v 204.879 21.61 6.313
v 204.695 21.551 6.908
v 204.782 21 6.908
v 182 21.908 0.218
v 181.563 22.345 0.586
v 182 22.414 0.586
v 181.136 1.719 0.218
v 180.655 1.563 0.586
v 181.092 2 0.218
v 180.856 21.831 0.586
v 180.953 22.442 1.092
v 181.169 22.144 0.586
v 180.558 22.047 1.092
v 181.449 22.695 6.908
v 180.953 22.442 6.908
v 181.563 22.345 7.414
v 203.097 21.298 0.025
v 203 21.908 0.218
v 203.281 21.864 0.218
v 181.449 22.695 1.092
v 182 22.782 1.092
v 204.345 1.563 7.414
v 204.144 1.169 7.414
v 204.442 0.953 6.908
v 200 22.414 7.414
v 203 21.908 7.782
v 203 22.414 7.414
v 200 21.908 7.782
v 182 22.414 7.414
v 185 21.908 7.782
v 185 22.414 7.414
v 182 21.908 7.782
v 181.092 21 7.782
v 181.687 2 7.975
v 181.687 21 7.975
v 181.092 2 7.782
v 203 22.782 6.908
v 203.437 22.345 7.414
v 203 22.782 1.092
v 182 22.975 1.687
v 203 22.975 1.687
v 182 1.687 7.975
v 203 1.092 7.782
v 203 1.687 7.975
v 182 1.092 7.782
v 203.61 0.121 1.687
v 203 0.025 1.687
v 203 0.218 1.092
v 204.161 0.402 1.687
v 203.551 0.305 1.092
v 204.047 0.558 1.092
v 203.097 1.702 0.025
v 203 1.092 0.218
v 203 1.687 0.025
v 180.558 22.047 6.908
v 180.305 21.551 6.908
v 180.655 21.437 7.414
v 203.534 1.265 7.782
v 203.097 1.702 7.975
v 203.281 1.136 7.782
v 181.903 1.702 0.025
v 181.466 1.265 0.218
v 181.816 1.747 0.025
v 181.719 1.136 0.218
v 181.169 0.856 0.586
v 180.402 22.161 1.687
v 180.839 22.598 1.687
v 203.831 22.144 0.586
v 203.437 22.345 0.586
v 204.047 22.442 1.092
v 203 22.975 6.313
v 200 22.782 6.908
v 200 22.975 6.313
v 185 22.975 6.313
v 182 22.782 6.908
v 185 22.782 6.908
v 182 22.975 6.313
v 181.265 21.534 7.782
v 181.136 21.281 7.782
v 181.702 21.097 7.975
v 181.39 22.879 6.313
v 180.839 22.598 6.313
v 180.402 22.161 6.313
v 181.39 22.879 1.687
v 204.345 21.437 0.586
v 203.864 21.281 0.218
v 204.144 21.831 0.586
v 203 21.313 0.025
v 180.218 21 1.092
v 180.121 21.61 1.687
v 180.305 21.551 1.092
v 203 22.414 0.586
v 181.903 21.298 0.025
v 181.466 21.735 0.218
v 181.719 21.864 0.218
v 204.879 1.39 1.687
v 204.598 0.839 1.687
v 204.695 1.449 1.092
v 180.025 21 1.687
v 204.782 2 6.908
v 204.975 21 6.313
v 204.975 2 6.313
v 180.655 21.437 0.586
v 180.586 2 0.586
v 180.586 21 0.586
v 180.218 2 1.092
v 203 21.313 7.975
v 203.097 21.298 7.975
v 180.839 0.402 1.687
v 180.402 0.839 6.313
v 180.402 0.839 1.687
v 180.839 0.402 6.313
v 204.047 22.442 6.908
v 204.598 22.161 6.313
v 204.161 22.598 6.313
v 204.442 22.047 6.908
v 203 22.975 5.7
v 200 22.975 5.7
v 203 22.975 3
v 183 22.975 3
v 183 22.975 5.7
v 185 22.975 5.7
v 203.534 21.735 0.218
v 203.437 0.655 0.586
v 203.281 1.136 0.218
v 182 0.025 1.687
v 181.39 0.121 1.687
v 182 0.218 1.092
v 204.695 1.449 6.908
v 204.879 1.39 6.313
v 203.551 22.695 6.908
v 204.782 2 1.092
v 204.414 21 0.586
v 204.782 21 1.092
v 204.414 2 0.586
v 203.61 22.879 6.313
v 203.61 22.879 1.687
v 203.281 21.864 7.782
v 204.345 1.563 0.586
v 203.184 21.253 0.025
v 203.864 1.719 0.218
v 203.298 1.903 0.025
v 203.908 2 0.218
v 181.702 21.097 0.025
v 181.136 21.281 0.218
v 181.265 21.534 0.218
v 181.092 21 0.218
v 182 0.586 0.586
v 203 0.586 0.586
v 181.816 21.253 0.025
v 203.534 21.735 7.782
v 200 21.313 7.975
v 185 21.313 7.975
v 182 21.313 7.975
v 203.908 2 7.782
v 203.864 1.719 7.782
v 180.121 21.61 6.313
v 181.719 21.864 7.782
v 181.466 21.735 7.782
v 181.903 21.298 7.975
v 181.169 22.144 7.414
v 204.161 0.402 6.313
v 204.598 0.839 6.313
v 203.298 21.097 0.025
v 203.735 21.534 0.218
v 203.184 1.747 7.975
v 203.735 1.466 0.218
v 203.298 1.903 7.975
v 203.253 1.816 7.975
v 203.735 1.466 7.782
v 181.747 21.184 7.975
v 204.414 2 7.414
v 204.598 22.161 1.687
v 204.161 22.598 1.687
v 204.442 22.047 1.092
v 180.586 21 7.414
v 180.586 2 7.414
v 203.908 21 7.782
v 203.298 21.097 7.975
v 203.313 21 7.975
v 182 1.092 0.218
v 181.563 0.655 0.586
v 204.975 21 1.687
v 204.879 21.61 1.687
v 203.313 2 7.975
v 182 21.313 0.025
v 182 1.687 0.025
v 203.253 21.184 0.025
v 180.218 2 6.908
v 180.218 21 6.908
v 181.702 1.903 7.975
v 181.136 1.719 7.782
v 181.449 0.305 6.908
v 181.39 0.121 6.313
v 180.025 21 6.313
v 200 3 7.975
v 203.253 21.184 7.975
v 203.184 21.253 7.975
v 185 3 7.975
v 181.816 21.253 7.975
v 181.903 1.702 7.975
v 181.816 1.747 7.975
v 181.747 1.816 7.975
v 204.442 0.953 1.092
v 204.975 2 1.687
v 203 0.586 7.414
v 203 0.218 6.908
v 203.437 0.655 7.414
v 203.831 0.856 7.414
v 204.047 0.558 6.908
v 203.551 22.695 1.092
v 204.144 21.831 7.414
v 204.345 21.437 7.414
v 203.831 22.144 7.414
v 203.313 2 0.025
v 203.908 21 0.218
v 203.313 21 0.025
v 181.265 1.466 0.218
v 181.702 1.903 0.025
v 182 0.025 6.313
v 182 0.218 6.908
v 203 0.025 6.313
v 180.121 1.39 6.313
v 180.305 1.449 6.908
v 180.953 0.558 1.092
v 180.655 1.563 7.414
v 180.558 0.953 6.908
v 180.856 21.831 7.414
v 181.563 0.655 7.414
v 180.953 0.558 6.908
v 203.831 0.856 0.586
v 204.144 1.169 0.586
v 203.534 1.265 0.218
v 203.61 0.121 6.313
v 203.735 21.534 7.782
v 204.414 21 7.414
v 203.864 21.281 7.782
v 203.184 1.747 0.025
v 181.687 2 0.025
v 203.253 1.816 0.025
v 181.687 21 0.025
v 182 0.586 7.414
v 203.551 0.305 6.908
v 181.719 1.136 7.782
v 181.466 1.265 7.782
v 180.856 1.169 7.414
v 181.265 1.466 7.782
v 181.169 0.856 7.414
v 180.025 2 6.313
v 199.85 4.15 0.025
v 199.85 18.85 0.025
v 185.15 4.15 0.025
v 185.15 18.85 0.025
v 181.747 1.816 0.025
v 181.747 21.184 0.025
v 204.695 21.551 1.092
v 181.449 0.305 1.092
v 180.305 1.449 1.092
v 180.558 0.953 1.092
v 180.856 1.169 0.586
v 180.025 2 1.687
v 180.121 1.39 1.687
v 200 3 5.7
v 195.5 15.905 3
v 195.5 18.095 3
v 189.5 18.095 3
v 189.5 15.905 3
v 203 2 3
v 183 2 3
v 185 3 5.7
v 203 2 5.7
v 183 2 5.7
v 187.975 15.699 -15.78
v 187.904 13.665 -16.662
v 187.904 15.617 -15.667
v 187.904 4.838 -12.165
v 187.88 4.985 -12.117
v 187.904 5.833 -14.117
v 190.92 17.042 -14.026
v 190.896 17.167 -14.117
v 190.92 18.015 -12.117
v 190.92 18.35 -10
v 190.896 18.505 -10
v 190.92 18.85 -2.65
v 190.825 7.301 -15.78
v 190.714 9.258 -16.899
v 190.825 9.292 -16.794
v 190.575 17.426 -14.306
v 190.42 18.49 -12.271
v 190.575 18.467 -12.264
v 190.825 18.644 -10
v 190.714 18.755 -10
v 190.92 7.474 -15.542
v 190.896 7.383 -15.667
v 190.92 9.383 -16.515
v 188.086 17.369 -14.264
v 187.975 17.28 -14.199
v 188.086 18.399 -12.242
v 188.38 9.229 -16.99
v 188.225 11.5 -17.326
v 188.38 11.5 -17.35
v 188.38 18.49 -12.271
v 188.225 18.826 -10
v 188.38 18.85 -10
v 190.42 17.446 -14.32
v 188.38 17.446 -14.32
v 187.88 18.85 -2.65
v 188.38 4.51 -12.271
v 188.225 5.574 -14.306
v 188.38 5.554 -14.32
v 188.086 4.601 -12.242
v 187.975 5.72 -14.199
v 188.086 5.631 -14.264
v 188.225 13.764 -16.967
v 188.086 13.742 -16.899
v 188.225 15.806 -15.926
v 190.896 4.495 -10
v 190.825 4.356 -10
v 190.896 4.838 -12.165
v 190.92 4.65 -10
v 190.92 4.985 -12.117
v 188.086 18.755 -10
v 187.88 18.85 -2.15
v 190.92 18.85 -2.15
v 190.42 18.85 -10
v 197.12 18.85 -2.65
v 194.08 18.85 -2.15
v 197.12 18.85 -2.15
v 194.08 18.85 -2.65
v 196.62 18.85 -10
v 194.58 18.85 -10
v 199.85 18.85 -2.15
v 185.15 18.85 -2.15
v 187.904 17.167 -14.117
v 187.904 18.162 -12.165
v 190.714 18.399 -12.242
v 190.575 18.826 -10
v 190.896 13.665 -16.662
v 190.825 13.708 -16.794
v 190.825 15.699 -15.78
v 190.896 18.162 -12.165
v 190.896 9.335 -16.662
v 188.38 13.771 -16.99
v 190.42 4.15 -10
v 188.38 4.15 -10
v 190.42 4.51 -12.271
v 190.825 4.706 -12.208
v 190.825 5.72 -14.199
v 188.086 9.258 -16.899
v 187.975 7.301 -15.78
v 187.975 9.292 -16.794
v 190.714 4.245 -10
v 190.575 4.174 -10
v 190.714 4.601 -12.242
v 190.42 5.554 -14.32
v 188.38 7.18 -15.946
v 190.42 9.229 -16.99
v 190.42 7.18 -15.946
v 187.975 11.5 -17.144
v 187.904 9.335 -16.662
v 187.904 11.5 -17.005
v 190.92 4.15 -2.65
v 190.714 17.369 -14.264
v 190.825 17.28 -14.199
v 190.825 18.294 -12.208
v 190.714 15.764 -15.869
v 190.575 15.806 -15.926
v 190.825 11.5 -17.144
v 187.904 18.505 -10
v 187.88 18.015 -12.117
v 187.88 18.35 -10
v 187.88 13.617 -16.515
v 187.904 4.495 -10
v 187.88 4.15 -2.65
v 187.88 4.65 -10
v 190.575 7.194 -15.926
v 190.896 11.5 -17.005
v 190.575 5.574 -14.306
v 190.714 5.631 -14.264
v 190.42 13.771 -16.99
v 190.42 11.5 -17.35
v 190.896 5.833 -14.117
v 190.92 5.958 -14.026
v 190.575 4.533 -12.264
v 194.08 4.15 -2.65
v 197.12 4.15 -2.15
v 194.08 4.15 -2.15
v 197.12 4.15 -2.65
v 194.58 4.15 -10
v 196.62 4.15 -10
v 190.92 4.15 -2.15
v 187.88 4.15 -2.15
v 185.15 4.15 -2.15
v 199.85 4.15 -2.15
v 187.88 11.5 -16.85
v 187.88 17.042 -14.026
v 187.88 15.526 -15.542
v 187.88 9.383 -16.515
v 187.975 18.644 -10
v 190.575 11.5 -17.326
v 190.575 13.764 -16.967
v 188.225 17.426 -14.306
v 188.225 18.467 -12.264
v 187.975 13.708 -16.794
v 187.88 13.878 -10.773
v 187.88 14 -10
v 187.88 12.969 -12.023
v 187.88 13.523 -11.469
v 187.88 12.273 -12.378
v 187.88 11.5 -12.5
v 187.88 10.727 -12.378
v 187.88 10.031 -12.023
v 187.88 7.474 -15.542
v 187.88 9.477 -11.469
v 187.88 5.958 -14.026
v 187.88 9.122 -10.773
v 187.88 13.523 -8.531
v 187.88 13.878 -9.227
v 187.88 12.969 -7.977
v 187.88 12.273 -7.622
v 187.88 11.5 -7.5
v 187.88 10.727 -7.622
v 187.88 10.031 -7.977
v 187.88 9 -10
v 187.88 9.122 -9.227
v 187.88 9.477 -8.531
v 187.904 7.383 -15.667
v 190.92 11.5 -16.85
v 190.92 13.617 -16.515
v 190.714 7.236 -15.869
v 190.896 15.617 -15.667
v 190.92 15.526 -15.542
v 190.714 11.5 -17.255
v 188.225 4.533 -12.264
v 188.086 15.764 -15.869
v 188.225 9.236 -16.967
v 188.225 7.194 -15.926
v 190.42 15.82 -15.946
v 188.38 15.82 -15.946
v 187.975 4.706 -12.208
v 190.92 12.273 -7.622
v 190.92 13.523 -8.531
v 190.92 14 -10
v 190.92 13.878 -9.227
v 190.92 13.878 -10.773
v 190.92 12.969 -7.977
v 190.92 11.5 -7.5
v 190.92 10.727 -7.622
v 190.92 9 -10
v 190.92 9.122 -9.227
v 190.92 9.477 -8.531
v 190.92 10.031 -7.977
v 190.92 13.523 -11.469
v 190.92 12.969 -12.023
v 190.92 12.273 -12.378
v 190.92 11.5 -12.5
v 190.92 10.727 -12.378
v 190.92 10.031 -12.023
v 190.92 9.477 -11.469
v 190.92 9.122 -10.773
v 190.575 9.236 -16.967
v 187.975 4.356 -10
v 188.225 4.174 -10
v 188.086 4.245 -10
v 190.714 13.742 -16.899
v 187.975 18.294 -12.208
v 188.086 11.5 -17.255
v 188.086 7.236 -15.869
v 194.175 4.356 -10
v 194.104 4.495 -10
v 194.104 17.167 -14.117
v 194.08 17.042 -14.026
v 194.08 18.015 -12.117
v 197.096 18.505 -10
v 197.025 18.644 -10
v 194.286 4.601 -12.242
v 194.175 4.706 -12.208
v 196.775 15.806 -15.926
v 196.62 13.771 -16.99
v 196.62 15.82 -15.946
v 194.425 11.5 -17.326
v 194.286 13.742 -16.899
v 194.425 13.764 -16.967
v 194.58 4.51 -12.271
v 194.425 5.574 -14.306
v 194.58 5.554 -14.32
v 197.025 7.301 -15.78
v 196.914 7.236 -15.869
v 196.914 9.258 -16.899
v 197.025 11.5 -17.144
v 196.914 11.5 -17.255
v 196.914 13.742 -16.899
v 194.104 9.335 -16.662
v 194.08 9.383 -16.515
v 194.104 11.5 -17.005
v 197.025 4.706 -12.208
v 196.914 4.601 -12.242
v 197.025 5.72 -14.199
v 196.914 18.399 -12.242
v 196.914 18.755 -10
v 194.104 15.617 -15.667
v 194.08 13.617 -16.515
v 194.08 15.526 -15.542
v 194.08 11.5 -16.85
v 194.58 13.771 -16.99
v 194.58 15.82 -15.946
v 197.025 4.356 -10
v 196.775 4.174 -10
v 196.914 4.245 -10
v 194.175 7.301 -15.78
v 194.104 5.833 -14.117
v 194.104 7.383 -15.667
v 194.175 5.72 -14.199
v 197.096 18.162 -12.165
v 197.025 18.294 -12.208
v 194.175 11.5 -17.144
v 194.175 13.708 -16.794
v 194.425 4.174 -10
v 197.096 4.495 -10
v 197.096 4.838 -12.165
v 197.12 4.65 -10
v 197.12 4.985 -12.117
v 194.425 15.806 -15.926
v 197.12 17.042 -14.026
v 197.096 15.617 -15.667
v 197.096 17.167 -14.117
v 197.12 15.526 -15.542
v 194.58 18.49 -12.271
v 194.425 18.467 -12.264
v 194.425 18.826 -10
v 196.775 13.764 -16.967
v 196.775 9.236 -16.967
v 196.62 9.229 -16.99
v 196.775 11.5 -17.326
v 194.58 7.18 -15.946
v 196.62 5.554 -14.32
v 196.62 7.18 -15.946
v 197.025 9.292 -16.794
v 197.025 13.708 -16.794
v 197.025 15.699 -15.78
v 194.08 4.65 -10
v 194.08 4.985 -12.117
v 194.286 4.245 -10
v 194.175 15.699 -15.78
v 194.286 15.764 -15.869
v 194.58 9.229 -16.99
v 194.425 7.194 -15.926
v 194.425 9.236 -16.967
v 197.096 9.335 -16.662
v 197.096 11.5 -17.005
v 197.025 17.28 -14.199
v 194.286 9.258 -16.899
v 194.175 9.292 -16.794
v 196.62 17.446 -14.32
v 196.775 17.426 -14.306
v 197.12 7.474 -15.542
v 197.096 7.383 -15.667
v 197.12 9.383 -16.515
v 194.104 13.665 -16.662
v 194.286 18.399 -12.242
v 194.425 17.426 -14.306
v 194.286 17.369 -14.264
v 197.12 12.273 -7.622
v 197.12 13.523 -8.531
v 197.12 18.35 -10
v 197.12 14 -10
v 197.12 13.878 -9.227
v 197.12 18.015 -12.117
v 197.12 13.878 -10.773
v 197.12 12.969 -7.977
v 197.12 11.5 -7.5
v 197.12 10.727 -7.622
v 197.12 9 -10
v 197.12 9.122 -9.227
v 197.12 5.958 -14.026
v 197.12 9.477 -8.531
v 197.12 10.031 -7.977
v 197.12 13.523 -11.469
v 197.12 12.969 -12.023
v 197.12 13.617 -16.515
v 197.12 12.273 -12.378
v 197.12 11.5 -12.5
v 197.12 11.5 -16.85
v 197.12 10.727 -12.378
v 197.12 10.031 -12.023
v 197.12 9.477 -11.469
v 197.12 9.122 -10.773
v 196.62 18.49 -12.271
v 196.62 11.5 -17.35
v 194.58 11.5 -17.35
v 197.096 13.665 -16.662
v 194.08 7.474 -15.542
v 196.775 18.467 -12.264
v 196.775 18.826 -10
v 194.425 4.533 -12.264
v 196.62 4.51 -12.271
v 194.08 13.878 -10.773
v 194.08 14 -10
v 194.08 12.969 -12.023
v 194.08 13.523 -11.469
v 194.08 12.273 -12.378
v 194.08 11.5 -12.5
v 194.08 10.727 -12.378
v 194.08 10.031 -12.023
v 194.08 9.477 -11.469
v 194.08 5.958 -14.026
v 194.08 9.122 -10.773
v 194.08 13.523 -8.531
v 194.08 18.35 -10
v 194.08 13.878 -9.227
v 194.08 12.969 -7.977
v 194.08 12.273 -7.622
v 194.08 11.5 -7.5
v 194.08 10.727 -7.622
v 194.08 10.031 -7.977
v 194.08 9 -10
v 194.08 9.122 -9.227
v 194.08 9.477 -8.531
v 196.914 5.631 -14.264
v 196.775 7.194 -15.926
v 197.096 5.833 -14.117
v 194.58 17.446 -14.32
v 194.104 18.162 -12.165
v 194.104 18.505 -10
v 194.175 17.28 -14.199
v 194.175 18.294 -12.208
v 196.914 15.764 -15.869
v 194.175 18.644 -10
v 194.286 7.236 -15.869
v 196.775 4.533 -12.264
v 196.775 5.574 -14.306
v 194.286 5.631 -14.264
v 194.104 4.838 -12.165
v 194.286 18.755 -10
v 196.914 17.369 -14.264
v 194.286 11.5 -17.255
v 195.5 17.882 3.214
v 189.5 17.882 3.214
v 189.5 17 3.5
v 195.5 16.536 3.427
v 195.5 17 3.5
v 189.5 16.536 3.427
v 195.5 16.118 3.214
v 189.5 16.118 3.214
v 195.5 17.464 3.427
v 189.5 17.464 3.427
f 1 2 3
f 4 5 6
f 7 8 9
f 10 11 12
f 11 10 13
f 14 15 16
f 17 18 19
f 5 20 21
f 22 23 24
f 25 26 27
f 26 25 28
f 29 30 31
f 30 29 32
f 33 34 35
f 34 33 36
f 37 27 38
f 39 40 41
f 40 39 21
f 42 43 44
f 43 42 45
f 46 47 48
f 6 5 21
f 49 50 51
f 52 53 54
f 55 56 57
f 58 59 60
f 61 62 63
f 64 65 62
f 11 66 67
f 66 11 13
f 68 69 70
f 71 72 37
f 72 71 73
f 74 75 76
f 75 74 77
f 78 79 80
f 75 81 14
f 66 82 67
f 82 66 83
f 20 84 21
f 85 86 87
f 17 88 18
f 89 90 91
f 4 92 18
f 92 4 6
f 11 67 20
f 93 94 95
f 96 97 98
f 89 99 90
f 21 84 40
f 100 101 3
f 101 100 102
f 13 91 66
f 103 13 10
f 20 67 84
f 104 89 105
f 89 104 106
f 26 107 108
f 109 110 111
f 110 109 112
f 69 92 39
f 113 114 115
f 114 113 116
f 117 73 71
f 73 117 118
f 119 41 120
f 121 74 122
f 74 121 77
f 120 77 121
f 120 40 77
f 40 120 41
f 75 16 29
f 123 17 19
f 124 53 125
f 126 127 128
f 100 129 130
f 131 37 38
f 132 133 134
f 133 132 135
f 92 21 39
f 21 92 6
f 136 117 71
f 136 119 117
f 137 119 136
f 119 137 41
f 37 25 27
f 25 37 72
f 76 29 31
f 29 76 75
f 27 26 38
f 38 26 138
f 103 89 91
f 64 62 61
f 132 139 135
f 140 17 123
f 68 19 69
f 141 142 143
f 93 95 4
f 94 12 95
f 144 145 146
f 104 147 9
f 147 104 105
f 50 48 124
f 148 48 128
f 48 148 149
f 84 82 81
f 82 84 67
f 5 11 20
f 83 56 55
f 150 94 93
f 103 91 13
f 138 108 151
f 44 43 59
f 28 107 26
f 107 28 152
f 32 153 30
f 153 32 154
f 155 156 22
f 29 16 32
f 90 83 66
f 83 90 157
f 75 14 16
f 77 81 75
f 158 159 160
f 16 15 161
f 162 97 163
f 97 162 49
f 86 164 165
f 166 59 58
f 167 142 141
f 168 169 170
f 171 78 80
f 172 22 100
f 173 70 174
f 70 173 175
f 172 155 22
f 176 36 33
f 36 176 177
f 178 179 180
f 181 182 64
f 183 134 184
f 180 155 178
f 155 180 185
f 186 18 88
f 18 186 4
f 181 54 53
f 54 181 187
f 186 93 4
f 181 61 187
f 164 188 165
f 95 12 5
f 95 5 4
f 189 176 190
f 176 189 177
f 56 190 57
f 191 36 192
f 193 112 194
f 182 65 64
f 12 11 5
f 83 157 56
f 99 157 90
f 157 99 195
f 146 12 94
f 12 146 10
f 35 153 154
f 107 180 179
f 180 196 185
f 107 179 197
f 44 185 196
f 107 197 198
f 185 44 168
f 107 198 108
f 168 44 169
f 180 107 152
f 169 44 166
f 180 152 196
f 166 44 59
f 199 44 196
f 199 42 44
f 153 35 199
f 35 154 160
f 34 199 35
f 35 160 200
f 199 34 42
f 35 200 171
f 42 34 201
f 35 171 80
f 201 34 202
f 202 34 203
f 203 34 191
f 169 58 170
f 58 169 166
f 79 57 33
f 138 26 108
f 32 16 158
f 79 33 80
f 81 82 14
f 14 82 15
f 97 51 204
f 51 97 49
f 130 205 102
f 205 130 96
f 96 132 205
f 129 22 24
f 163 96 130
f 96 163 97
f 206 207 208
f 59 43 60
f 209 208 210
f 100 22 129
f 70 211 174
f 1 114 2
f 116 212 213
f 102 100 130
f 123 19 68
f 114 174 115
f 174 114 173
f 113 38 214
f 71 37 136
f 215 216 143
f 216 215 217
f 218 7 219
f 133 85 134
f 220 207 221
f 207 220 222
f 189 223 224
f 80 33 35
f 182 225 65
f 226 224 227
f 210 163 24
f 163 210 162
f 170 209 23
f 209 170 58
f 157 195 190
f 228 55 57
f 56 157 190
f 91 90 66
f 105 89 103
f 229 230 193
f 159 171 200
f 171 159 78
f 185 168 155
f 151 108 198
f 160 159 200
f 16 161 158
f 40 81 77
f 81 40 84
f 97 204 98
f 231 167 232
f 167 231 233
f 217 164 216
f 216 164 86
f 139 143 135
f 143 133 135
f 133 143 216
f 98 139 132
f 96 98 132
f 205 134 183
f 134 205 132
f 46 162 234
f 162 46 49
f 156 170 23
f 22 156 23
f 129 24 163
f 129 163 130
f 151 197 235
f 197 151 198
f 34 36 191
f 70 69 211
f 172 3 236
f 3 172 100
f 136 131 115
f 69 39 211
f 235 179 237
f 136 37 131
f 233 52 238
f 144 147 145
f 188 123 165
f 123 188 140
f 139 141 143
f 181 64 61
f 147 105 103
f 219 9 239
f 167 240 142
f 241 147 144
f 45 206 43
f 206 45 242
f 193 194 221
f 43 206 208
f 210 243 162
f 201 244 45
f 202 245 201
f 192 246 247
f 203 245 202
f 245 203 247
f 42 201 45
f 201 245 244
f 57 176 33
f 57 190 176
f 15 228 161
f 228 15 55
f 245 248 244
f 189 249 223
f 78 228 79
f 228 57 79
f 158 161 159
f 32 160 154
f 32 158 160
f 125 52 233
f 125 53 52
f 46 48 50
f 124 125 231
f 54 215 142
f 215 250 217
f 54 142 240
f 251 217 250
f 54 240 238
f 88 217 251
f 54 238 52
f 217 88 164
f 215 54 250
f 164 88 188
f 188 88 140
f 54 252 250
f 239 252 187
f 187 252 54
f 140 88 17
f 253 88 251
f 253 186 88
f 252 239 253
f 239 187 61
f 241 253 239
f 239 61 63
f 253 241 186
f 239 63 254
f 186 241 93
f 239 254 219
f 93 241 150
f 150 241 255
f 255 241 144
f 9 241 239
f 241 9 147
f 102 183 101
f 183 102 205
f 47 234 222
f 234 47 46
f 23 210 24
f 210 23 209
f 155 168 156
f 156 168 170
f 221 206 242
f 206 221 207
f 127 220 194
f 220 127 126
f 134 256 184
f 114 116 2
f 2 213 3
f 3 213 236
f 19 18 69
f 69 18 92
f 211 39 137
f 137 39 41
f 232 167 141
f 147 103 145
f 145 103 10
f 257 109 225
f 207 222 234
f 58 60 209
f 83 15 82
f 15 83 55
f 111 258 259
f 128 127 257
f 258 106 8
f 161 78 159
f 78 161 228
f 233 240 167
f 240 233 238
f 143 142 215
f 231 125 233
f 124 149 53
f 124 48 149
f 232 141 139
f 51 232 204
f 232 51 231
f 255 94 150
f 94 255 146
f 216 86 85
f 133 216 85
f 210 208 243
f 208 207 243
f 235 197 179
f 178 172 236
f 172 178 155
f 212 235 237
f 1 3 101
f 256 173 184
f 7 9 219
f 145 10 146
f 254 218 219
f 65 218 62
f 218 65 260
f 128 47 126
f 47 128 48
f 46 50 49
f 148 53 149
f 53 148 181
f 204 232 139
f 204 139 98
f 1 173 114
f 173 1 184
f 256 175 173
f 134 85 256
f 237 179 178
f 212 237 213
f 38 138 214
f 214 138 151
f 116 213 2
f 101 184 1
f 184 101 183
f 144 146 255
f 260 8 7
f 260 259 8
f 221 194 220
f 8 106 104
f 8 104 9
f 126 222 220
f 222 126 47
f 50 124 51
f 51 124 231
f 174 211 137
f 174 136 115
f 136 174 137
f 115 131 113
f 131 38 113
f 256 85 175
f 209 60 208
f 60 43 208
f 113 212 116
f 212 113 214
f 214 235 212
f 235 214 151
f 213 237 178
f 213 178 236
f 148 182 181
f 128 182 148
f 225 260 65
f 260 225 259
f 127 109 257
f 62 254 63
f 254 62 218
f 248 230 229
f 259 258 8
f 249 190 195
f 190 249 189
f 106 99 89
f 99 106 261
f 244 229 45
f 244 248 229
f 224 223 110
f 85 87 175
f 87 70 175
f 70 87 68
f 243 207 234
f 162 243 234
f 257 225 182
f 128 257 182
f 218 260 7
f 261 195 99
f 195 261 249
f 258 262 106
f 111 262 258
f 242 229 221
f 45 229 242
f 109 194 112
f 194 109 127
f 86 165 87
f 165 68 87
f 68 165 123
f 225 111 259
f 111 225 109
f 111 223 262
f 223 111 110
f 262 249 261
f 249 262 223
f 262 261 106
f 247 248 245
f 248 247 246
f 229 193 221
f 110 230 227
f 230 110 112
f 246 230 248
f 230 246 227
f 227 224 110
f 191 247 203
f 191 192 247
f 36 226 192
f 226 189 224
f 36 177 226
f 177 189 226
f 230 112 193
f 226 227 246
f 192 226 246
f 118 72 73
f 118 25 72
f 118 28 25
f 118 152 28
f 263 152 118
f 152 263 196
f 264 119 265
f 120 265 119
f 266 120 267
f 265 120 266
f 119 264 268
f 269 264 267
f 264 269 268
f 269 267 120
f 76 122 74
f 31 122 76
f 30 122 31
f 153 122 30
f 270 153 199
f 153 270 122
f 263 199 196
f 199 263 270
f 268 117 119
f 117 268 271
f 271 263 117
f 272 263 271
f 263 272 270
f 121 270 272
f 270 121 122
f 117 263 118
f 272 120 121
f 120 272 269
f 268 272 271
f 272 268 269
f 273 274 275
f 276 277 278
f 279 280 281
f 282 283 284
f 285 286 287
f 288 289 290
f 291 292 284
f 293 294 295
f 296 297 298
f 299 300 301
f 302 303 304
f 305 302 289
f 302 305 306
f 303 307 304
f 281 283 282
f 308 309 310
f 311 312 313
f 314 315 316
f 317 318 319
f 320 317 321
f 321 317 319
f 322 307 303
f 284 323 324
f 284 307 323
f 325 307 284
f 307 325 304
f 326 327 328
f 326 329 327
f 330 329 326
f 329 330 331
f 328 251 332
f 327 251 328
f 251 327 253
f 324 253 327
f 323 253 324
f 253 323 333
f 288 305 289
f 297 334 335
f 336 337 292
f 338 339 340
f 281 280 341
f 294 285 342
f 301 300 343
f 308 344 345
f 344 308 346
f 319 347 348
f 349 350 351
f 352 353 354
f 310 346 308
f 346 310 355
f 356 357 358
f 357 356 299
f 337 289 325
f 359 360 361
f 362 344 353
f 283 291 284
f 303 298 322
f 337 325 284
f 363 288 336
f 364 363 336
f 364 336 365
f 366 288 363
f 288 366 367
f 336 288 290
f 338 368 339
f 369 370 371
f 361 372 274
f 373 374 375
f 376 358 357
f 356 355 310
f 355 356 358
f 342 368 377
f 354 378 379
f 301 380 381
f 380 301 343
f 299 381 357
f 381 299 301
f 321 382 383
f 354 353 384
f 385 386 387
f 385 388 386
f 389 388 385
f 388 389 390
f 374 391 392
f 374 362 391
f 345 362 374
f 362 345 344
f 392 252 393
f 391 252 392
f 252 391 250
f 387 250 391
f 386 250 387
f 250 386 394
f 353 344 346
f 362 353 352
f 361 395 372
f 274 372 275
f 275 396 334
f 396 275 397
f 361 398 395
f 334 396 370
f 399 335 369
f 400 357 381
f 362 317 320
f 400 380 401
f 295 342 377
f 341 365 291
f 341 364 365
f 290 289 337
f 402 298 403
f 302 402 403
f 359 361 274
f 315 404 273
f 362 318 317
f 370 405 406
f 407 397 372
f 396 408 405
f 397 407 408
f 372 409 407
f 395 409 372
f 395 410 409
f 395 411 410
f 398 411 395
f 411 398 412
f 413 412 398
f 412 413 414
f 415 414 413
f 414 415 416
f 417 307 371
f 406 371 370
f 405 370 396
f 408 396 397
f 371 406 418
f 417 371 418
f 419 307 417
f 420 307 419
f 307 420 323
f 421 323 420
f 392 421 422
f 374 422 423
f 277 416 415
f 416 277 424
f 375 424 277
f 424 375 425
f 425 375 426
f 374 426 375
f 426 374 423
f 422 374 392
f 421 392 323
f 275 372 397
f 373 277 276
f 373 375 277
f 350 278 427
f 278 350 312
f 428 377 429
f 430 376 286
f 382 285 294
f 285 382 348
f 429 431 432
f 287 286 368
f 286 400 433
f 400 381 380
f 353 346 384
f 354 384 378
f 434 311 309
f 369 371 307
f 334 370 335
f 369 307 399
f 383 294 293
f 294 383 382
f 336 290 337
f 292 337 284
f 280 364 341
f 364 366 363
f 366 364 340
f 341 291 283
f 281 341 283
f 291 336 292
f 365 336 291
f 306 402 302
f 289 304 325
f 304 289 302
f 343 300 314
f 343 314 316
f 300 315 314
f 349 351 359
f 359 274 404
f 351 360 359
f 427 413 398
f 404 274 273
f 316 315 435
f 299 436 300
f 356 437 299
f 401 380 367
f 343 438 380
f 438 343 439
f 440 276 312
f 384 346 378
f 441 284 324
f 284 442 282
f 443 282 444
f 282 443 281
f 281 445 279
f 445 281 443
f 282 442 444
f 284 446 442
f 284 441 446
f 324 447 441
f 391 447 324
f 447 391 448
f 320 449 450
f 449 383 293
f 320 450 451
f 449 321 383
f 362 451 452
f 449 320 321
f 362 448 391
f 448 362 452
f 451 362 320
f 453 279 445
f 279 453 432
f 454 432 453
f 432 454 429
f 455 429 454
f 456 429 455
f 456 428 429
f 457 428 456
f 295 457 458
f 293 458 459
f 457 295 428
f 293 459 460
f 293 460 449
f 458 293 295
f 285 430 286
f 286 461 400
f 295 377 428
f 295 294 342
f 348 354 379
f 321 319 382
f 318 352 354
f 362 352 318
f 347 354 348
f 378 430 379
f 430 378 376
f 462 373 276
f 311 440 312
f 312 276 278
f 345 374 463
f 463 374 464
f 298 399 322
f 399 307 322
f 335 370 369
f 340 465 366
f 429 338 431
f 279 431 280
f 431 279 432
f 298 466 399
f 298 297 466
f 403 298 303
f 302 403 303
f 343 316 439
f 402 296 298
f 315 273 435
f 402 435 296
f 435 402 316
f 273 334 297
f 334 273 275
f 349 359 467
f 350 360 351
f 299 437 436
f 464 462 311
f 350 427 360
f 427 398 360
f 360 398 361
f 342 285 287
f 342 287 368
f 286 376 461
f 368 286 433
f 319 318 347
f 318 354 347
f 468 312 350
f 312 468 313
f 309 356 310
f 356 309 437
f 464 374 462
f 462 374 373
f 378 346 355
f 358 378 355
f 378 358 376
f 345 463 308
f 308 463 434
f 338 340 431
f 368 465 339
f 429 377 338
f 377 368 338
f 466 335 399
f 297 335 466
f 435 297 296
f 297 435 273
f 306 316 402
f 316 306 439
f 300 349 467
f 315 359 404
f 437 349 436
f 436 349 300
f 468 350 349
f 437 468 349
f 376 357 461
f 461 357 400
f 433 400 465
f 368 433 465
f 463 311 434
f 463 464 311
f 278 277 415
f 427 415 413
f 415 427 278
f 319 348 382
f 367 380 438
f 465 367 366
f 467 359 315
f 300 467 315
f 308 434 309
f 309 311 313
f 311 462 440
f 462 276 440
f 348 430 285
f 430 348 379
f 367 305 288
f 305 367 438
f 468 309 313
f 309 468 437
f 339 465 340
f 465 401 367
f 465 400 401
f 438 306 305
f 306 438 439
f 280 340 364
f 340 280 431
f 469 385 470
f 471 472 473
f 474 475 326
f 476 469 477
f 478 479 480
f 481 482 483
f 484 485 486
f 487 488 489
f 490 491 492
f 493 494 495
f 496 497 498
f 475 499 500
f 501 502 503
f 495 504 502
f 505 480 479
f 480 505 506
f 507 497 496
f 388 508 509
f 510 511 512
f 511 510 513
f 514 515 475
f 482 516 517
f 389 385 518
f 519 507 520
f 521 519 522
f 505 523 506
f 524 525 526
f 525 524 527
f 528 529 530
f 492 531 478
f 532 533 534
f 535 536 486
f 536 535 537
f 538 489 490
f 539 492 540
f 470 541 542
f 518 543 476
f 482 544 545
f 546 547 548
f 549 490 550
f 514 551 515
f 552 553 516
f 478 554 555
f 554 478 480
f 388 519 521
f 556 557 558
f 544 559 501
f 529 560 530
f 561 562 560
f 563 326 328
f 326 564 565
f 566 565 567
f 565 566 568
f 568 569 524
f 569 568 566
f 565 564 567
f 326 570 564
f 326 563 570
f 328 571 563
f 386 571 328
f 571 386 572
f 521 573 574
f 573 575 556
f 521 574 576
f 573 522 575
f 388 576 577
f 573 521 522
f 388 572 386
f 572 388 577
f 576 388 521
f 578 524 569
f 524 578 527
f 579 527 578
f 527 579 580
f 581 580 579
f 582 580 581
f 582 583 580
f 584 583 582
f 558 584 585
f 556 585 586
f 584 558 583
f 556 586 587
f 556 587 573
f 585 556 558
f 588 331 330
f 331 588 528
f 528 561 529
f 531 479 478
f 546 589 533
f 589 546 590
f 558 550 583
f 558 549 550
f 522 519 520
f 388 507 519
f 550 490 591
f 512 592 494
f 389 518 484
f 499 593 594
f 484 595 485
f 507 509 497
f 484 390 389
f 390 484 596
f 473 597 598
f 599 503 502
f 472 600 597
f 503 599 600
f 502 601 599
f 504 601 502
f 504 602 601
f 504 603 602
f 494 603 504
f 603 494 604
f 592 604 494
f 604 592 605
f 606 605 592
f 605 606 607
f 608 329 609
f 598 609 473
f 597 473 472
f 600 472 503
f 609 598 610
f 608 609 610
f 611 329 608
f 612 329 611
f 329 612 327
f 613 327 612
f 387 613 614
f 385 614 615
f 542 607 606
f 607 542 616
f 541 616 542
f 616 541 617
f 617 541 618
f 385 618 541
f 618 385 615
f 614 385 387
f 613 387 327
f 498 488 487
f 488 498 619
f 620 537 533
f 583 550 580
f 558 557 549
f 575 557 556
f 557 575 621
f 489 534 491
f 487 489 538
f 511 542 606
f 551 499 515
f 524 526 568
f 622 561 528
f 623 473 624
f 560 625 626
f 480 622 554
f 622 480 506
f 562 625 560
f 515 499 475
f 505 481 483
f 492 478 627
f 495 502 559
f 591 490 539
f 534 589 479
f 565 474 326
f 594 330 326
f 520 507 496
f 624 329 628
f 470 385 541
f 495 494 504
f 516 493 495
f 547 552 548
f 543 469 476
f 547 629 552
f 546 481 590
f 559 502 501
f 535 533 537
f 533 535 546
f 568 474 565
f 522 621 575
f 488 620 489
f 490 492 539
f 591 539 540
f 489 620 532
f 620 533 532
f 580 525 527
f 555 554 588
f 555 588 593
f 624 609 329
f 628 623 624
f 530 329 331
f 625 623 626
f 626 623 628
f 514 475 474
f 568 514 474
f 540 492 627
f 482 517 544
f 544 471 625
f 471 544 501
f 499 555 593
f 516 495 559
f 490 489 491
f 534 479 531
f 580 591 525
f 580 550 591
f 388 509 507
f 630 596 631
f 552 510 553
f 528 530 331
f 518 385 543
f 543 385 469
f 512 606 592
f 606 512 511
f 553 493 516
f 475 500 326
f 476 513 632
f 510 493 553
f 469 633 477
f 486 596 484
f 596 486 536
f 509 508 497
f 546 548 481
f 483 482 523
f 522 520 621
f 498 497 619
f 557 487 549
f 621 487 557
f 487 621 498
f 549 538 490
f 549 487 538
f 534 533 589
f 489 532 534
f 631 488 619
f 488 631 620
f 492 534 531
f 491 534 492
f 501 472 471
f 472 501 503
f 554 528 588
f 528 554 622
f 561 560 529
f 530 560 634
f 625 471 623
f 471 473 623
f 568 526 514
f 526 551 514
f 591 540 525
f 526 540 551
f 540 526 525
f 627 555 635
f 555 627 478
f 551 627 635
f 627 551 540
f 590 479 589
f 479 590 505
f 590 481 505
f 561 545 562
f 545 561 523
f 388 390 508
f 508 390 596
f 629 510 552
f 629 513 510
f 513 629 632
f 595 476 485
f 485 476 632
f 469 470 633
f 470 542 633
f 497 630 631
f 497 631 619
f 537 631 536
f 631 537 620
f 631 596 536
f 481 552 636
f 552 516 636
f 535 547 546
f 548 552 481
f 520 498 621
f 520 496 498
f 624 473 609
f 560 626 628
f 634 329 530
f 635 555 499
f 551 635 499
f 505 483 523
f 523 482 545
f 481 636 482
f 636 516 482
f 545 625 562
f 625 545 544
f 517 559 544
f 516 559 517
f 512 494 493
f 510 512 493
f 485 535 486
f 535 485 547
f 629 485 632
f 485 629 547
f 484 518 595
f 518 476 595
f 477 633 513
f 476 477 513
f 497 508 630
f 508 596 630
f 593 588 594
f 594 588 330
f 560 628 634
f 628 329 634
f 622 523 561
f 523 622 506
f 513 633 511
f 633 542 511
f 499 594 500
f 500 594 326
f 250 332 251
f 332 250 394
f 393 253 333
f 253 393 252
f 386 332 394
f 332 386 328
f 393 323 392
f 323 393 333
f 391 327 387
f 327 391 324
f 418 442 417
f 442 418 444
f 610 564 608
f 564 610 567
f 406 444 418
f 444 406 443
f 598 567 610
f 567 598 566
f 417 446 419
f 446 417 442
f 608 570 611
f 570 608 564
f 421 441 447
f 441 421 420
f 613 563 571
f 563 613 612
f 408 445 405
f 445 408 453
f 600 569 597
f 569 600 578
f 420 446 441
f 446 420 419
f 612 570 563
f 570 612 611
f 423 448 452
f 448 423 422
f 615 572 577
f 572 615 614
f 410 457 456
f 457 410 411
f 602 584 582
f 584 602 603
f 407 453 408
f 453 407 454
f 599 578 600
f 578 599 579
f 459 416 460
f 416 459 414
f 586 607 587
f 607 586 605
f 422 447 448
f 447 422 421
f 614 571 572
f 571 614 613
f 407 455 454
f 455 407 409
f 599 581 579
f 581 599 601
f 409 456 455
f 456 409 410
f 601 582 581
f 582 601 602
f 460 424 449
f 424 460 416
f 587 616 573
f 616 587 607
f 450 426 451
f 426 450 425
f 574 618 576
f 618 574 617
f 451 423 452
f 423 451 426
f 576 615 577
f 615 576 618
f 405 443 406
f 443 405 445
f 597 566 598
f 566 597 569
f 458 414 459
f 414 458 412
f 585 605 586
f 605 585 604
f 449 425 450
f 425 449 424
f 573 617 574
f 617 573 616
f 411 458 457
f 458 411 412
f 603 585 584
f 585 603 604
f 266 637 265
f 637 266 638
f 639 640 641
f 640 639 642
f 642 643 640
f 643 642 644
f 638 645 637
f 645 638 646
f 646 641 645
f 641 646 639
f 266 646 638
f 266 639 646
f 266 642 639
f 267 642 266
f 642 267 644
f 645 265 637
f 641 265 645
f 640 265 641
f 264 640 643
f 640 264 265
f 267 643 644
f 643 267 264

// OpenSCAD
$fn = 20;
use <libraries/gopro_mounts_mooncactus.scad>

outside_length = 40;
outside_width = 26;
outside_height = 6;
inside_length = outside_length + 2;
inside_width = 18.1;
inside_height = 2;
space_width = 14;

clamp_offset = 60;
//clamp_dia = 31.8;
clamp_dia = 35;


// Enables the light mount
lightmount_enabled = 0;
// Use the gopro mount or the tab mount - 1 = gopro
gopro_tab_enabled = 1;
// Handlebar clamp mount
clamp_enabled = 0;
// Helmet platform mount
helmet_platform_enable = 0;
// Serfas Light mount
serfas_light_mount = 1;

module rounded_box(x,y,z,r){
    translate([r,r,r])
    minkowski(){
        cube([x-r*2,y-r*2,z-r*2]);
        sphere(r=r, $fs=0.1);
    }
}

if (lightmount_enabled)
{
    difference()
    {
        cube([outside_width,outside_length,outside_height]);
        translate([(outside_width-inside_width)/2,-1,outside_height-3.5]) cube([inside_width,inside_length,inside_height]);
        translate([6,-1,outside_height-2]) cube([space_width,inside_length,inside_height+2]);
        translate([5.75,-2,outside_height-2.5]) {
            rotate([0, 0, 65]) {
                cube([5,2,3]);
            }
        }
        translate([outside_width-4.5,0,outside_height-2.5]) {
            rotate([0, 0, 115]) {
                cube([5,2,3]);
            }
        }
    }
    translate([inside_width/2+1.5,outside_length-2,2]) rotate([0,90,0]) cylinder(h=5,r=1);

    if (gopro_tab_enabled)
    {
        // Create a "triple" gopro connector
        translate([outside_width/2,outside_length/2,-10]) rotate([90,0,90]) gopro_connector("double");
    }
    else
    {
        difference()
        {
            union()
            {
                translate([outside_width/2-8,outside_length/2-7.5,-7]) cube([6,15,7]);
                translate([outside_width/2-8,outside_length/2,-7]) rotate([0,90,0]) cylinder(h=6,d=15);
            }
            translate([outside_width/2-8,outside_length/2,-7]) rotate([0,90,0]) cylinder(h=7,d=5);
            translate([outside_width/2-12,outside_length/2,-7]) rotate([0,90,0]) cylinder(h=7,d=9);
        }
        translate([inside_width/2+1.25,outside_length/2,-4]) rotate([0,0,0]) cylinder(h=3,r=1);
        translate([inside_width/2+1.25,outside_length/2,-13]) rotate([0,0,0]) cylinder(h=3,r=1);
        translate([inside_width/2+1.25,outside_length/2-3,-7]) rotate([90,0,0]) cylinder(h=3,r=1);
        translate([inside_width/2+1.25,outside_length/2+6,-7]) rotate([90,0,0]) cylinder(h=3,r=1);
    }

}

if (clamp_enabled)
{
    translate([clamp_offset,0,0])
    gopro_bar_clamp(
        rod_d= clamp_dia, // rod diameter
        th= 5.0, // main thickness
        gap= 2.4, // space between the clamps
        screw_d= 4.25, // screw diameter
        screw_head_d= 8.2, // screw head diameter
        screw_nut_d= 8.01, // nut diameter from corner to corner
        screw_shoulder_th=5.5, // thickness of the shoulder on which the nut clamps
        screw_reversed=0	 // true to mirror the orientation of the clamp bolts
    );

    translate([clamp_offset,0,0]) gopro_connector("triple");
}

if (helmet_platform_enable)
{
    translate([100,0,0])
    {
        difference()
        {
            rounded_box(50, 50, 5, 1);
            translate ([5, 5, -1]) cube([5, 40, 7]);
            translate ([40, 5, -1]) cube([5, 40, 7]);
        }
        translate([17,17,0]) cube([16, 16, 15]);
        translate([25,25,25]) rotate([270, 0, 90]) gopro_connector("triple");
    }
}

if (serfas_light_mount)
{
    translate([180, 0, 0])
    {
        difference()
        {
            rounded_box(25, 23, 8, 2);
            translate ([5, 3, 3]) cube([15, 23, 5]);
            translate ([3, 2, 3]) cube([20, 23, 2.7]);
        }
        translate([9.5, 17, 2.0]) rotate([0,90,0]) cylinder(h=6,d=3);
        translate([12.5, 11.5,-10]) rotate([90,0,90]) gopro_connector("double");
    }
}
